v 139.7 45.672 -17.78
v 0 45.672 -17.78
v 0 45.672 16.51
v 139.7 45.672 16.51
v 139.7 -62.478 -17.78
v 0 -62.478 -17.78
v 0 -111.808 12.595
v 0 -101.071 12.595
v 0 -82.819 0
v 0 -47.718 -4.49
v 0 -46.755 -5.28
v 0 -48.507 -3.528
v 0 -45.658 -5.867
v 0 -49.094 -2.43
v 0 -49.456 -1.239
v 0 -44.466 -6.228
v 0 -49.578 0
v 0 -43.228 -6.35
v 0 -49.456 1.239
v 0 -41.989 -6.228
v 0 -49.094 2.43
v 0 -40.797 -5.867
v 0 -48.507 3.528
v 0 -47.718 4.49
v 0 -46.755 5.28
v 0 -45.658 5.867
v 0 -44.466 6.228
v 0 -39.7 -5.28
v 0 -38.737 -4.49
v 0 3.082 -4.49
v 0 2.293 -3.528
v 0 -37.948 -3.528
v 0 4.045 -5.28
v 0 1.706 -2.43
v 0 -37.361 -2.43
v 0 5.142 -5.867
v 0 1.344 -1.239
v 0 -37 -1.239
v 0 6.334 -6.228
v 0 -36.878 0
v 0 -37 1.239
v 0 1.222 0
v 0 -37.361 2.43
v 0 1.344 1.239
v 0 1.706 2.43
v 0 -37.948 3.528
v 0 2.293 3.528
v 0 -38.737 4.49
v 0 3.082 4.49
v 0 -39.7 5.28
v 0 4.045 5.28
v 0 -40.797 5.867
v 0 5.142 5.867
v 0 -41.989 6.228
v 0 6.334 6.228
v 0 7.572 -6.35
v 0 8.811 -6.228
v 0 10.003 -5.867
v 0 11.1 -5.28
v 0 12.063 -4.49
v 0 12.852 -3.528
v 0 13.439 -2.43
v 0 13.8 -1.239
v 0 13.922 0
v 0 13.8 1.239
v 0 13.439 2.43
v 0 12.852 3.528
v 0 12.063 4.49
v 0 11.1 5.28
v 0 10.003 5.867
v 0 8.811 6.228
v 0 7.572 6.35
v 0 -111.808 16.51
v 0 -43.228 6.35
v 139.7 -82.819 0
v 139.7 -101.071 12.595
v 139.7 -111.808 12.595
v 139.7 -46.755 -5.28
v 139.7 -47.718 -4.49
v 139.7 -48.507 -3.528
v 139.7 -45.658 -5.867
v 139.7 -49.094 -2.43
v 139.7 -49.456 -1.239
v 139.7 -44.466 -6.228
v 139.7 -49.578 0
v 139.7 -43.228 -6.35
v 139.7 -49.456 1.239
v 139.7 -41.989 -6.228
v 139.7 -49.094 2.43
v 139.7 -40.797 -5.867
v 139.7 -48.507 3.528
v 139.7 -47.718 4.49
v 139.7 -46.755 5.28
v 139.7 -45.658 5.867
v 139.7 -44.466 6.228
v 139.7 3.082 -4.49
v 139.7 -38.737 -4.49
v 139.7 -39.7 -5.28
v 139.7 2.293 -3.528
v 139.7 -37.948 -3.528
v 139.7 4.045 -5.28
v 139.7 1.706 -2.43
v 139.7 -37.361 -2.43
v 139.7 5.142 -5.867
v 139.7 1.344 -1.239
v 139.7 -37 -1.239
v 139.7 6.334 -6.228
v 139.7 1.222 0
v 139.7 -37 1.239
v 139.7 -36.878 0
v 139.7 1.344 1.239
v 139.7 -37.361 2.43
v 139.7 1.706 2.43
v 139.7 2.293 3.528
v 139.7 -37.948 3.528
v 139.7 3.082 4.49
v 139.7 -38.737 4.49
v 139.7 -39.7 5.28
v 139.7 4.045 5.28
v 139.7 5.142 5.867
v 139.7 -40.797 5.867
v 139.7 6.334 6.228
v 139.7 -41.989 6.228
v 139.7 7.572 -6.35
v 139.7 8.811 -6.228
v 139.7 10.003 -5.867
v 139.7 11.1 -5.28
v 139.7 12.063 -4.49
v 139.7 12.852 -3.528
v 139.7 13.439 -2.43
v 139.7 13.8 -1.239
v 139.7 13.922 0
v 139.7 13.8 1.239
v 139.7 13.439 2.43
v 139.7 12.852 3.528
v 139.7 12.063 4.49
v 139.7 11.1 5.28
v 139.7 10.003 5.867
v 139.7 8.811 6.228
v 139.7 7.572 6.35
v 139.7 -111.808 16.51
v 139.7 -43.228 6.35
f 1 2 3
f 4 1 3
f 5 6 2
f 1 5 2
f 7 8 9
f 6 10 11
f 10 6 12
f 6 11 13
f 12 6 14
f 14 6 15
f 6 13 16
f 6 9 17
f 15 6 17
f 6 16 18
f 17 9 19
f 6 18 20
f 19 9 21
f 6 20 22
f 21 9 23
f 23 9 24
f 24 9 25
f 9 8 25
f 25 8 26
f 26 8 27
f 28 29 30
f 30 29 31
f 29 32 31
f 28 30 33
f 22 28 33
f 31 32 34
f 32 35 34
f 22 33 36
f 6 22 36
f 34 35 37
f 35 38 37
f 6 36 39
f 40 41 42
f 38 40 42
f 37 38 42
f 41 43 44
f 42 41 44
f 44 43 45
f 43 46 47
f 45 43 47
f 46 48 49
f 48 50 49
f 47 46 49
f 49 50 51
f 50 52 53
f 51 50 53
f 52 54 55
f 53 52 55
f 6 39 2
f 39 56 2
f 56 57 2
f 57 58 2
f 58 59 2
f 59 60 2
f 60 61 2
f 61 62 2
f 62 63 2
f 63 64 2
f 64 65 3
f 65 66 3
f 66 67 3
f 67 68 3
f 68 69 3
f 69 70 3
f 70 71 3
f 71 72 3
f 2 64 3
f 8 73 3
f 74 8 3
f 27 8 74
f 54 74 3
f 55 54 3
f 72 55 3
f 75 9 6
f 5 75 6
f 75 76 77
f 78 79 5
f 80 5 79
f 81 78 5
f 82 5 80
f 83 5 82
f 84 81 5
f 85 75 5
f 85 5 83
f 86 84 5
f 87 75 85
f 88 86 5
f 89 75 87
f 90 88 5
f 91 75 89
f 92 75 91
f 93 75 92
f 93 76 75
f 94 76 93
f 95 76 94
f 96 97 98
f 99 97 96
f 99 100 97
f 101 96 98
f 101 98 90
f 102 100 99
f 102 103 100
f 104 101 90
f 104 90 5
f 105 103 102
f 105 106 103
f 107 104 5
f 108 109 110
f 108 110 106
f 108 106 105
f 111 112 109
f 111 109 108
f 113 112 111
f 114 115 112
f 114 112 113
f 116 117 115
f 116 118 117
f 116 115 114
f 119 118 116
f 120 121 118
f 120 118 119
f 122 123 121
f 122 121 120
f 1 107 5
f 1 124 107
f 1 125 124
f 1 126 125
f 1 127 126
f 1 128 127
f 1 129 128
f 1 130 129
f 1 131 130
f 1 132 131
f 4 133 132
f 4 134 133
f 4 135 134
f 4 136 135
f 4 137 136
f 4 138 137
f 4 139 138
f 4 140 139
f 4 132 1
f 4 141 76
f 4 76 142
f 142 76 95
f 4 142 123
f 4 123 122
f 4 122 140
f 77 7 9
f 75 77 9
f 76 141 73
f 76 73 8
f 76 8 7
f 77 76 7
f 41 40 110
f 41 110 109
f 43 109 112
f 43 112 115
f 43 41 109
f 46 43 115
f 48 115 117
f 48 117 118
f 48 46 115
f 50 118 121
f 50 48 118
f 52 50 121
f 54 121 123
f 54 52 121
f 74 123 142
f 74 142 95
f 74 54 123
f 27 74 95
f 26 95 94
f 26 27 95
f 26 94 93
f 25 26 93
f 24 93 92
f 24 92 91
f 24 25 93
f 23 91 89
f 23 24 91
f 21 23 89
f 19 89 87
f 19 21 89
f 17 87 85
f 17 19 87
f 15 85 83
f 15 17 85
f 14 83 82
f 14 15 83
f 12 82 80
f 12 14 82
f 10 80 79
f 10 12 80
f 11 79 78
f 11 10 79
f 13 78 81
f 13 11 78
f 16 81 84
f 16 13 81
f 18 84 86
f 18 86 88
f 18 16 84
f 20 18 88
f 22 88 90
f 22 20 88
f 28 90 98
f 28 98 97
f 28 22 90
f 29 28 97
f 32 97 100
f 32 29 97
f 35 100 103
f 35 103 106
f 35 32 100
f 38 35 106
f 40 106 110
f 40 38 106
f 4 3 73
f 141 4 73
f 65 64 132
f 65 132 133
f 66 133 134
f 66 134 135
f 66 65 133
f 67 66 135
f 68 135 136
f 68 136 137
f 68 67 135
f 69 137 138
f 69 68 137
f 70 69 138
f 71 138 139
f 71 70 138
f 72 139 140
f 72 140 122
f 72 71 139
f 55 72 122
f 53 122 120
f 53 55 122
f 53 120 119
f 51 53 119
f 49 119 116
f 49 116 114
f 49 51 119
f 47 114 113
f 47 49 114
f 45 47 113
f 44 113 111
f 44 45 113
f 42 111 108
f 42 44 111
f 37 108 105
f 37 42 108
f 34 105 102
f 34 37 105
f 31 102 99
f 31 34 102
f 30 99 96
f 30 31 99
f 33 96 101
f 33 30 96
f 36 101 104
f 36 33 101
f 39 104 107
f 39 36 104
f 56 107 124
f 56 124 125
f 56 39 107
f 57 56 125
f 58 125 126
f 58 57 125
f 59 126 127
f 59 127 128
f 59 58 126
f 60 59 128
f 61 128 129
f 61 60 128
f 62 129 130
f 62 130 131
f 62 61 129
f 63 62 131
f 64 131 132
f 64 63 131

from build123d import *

# Parameters (mm, degrees)
F0_R     = 6.35
F1_DEPTH = 139.7


with BuildPart() as f1:
    # F0 (on Right) → F1 (new body)
    with BuildSketch(Plane.YZ):
        Polygon((45.672475, -17.78), (45.672475, 16.51), (-111.807525, 16.51), (-101.070702, 12.595123), (-111.807525, 12.595123), (-82.819068, 0), (-62.477541, -17.78), align=None)
        with Locations((-43.227525, 0)):
            Circle(F0_R, mode=Mode.SUBTRACT)
        with Locations((7.572475, 0)):
            Circle(F0_R, mode=Mode.SUBTRACT)
    extrude(amount=F1_DEPTH)


solid = f1.part
